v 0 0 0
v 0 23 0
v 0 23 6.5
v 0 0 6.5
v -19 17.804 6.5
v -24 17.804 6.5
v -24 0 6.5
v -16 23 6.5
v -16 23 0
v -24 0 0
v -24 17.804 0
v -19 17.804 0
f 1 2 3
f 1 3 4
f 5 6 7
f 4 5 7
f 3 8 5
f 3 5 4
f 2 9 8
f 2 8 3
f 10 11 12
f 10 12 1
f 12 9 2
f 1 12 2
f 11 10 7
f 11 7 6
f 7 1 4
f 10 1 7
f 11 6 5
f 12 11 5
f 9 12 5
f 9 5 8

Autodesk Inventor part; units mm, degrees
ref_plane "YZ Plane" through (0, 0, 0) normal (1, 0, 0) x (0, 1, 0)
ref_plane "XZ Plane" through (0, 0, 0) normal (0, 1, 0) x (-1, 0, 0)
ref_plane "XY Plane" through (0, 0, 0) normal (0, 0, 1) x (1, 0, 0)
sketch "Sketch1" plane through (0, 0, 0) normal (0, 0, 1) x (1, 0, 0)
  line L0 (0, 0) -> (-24, 0)
  line L1 (-24, 0) -> (-24, 23)
  line L2 (-24, 23) -> (0, 23)
  line L3 (0, 23) -> (0, 0)
  line L4 (-24, 17.8038) -> (-19, 17.8038)
  line L5 (-19, 17.8038) -> (-16, 23)
  dimension "d0" = 23
  dimension "d1" = 24
  dimension "d2" = 120
  dimension "d3" = 5
  dimension "d4" = 6
extrude "Extrusion1" add sketch "Sketch1" along normal blind 6.5 contours L0 L1 L4 L5 L2 L3
properties part number "Cam_SD_base"
